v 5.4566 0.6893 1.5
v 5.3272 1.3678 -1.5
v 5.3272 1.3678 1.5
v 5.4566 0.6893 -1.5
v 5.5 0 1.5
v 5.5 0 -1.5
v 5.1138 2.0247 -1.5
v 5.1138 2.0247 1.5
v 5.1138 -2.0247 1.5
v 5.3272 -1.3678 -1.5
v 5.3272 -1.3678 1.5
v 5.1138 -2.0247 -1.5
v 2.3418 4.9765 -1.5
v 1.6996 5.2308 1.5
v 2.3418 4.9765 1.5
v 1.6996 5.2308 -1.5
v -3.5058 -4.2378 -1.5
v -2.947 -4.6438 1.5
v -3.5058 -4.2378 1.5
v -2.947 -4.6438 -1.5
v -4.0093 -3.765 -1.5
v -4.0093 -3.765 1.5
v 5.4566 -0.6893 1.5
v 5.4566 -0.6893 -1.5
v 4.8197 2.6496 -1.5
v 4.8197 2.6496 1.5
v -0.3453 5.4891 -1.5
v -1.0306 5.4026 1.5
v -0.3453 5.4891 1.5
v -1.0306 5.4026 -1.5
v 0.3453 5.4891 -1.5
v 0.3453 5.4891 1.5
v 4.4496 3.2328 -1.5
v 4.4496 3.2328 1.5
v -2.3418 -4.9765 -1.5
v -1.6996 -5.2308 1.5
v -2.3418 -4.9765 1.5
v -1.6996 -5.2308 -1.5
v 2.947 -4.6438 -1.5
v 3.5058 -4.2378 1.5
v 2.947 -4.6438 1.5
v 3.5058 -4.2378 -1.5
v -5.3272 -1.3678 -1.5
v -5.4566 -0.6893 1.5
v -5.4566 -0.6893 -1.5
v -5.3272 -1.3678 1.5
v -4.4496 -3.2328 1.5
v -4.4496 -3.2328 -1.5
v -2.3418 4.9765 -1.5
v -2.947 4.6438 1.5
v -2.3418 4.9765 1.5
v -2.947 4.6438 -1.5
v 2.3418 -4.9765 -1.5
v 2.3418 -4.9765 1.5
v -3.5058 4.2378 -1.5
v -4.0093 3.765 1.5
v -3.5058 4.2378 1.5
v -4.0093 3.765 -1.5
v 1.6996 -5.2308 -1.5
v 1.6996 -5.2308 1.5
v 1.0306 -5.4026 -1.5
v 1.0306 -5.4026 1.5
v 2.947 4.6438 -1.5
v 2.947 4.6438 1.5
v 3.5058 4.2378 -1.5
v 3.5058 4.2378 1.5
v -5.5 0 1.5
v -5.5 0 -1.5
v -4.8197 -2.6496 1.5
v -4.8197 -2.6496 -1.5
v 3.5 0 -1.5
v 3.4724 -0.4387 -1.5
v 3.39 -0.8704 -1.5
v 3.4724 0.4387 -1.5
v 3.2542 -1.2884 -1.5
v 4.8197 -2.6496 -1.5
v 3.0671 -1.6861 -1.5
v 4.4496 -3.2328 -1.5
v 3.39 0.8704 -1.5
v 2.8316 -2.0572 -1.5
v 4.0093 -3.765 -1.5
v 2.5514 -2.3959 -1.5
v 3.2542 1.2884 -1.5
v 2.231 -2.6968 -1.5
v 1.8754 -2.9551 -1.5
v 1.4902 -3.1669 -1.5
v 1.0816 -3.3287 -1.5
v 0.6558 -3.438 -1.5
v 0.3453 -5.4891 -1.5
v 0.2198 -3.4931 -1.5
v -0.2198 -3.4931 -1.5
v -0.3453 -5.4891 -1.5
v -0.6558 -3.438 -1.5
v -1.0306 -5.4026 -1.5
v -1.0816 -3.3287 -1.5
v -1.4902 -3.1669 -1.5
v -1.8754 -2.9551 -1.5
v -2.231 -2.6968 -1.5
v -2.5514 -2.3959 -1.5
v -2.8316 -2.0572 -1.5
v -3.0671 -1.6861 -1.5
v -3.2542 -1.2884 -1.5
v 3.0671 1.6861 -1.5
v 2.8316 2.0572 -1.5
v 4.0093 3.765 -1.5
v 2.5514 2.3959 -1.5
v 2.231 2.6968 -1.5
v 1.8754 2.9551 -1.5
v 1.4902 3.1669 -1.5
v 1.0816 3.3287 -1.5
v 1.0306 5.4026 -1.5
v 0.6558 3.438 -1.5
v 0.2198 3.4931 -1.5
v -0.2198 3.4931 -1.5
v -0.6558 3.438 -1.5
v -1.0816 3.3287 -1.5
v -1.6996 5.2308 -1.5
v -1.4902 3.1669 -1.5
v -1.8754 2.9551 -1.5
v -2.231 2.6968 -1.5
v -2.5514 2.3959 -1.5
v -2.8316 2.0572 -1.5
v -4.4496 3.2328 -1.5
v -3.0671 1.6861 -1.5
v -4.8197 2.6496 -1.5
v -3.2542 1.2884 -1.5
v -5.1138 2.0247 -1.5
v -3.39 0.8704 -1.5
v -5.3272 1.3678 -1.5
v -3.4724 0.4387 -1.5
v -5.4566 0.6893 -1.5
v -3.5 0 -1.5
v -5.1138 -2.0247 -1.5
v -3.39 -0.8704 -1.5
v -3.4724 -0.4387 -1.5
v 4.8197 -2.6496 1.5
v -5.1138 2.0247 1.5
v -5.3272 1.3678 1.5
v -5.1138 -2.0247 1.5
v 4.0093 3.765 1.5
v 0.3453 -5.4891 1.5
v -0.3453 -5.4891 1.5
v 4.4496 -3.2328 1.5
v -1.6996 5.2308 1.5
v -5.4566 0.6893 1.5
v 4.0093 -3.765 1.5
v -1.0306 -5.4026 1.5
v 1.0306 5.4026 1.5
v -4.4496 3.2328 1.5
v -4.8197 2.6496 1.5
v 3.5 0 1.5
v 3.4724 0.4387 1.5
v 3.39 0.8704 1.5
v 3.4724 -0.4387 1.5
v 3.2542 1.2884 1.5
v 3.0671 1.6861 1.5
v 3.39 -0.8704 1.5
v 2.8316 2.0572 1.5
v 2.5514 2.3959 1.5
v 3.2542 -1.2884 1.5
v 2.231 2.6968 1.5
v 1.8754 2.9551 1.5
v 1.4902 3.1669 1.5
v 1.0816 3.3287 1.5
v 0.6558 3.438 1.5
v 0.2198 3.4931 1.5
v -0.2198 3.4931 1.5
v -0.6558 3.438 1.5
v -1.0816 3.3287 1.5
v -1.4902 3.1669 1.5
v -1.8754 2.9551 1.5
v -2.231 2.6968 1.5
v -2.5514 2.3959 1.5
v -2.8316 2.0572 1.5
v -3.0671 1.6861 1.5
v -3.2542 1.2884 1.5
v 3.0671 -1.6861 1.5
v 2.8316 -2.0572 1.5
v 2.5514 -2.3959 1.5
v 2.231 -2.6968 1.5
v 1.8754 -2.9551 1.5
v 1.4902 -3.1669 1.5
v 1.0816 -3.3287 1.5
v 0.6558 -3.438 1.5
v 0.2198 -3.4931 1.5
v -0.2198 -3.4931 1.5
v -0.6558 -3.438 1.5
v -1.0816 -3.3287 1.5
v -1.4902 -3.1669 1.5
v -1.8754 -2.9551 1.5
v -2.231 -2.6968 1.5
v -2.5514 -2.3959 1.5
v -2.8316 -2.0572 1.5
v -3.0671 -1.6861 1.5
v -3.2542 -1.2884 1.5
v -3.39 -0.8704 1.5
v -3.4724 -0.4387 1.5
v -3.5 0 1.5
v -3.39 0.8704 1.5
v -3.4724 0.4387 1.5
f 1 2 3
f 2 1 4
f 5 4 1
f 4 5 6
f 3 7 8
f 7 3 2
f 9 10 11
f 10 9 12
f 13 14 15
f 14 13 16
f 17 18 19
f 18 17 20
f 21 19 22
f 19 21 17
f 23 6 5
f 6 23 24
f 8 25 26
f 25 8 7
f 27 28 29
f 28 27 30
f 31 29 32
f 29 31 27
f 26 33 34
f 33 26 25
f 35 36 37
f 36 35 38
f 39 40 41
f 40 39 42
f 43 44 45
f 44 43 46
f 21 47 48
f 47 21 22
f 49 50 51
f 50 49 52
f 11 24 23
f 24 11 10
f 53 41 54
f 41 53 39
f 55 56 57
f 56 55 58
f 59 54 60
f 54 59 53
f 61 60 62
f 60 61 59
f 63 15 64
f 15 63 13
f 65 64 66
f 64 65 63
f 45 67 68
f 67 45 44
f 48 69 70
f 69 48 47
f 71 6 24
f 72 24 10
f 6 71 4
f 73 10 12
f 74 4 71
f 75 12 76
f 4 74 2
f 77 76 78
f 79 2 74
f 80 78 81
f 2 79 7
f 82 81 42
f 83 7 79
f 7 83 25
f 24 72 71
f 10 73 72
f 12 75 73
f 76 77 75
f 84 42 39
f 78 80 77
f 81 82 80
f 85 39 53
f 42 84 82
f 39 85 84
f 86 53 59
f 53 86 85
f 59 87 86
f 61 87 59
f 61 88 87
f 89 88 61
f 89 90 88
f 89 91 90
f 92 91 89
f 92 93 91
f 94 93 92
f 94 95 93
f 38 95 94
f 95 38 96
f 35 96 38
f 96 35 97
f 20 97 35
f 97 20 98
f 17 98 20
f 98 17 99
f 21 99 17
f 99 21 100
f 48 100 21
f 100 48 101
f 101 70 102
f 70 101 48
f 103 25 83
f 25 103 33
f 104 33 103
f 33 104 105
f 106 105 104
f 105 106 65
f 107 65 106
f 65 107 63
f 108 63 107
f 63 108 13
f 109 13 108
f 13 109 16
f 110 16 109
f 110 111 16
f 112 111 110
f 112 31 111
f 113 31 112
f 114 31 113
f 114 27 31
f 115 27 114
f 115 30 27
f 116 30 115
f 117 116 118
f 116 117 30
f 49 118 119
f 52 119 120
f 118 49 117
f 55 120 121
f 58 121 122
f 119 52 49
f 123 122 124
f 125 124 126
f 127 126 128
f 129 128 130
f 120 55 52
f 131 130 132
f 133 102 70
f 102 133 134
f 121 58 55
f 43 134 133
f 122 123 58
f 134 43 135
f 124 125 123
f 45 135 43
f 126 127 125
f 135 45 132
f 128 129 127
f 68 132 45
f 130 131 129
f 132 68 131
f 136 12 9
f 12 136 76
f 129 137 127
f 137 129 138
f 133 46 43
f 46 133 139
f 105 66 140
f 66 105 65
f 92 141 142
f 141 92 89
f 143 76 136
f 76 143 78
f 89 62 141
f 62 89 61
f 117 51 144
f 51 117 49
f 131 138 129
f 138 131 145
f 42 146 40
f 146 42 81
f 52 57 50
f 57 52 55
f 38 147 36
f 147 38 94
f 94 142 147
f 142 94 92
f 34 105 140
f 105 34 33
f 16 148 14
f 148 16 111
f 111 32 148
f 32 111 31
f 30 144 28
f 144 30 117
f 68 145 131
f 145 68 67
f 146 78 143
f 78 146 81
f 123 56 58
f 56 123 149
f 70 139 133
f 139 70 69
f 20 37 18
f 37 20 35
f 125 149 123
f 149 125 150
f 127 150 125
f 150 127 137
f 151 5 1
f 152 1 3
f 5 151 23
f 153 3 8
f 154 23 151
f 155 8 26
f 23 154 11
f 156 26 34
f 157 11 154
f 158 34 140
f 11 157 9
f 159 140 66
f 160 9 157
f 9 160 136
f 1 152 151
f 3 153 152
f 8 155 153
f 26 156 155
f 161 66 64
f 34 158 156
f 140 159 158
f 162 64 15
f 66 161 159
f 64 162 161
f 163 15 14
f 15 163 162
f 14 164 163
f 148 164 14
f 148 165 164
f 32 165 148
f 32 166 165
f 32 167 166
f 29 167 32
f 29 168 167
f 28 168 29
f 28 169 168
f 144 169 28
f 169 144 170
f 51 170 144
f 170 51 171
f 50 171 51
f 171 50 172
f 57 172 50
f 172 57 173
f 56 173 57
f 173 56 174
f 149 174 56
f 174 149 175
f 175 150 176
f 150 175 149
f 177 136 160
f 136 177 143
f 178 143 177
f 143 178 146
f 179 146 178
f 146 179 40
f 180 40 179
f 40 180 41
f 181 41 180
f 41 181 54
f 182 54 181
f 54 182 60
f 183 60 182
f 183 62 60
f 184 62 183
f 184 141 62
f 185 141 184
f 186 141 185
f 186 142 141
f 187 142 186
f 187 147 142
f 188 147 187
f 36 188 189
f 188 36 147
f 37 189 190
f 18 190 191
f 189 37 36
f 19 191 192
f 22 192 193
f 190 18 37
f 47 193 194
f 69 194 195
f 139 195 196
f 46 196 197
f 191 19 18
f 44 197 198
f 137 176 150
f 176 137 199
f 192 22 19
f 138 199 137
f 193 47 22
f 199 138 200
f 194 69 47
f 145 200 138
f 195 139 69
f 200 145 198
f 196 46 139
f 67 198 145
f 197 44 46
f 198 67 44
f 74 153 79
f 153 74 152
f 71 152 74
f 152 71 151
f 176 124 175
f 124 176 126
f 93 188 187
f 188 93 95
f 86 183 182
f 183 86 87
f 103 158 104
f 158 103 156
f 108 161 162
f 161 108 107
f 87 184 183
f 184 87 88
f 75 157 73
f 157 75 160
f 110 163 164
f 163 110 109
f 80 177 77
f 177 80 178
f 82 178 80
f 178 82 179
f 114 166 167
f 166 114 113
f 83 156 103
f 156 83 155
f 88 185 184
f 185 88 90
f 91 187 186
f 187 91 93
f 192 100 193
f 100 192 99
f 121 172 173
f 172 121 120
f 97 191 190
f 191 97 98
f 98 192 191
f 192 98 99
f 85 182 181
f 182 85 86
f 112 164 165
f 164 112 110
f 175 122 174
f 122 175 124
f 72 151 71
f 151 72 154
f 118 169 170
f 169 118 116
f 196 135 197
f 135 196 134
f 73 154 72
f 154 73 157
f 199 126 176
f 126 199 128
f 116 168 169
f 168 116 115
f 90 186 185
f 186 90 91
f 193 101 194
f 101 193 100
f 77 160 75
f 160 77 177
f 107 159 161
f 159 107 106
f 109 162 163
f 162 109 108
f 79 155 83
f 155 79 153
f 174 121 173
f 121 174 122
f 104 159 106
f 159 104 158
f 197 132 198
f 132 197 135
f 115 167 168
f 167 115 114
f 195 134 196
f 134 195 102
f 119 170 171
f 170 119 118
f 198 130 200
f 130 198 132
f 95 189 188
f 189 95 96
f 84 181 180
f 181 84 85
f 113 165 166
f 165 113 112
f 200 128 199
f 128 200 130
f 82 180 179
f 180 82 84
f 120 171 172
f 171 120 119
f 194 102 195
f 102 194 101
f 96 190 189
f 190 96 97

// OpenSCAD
$fn = 50;


difference() {
	union() {
		translate(v = [0, 0, -1.5000000000]) {
			cylinder(h = 3, r = 5.5000000000);
		}
	}
	union() {
		translate(v = [0, 0, -100.0000000000]) {
			cylinder(h = 200, r = 3.5000000000);
		}
	}
}
